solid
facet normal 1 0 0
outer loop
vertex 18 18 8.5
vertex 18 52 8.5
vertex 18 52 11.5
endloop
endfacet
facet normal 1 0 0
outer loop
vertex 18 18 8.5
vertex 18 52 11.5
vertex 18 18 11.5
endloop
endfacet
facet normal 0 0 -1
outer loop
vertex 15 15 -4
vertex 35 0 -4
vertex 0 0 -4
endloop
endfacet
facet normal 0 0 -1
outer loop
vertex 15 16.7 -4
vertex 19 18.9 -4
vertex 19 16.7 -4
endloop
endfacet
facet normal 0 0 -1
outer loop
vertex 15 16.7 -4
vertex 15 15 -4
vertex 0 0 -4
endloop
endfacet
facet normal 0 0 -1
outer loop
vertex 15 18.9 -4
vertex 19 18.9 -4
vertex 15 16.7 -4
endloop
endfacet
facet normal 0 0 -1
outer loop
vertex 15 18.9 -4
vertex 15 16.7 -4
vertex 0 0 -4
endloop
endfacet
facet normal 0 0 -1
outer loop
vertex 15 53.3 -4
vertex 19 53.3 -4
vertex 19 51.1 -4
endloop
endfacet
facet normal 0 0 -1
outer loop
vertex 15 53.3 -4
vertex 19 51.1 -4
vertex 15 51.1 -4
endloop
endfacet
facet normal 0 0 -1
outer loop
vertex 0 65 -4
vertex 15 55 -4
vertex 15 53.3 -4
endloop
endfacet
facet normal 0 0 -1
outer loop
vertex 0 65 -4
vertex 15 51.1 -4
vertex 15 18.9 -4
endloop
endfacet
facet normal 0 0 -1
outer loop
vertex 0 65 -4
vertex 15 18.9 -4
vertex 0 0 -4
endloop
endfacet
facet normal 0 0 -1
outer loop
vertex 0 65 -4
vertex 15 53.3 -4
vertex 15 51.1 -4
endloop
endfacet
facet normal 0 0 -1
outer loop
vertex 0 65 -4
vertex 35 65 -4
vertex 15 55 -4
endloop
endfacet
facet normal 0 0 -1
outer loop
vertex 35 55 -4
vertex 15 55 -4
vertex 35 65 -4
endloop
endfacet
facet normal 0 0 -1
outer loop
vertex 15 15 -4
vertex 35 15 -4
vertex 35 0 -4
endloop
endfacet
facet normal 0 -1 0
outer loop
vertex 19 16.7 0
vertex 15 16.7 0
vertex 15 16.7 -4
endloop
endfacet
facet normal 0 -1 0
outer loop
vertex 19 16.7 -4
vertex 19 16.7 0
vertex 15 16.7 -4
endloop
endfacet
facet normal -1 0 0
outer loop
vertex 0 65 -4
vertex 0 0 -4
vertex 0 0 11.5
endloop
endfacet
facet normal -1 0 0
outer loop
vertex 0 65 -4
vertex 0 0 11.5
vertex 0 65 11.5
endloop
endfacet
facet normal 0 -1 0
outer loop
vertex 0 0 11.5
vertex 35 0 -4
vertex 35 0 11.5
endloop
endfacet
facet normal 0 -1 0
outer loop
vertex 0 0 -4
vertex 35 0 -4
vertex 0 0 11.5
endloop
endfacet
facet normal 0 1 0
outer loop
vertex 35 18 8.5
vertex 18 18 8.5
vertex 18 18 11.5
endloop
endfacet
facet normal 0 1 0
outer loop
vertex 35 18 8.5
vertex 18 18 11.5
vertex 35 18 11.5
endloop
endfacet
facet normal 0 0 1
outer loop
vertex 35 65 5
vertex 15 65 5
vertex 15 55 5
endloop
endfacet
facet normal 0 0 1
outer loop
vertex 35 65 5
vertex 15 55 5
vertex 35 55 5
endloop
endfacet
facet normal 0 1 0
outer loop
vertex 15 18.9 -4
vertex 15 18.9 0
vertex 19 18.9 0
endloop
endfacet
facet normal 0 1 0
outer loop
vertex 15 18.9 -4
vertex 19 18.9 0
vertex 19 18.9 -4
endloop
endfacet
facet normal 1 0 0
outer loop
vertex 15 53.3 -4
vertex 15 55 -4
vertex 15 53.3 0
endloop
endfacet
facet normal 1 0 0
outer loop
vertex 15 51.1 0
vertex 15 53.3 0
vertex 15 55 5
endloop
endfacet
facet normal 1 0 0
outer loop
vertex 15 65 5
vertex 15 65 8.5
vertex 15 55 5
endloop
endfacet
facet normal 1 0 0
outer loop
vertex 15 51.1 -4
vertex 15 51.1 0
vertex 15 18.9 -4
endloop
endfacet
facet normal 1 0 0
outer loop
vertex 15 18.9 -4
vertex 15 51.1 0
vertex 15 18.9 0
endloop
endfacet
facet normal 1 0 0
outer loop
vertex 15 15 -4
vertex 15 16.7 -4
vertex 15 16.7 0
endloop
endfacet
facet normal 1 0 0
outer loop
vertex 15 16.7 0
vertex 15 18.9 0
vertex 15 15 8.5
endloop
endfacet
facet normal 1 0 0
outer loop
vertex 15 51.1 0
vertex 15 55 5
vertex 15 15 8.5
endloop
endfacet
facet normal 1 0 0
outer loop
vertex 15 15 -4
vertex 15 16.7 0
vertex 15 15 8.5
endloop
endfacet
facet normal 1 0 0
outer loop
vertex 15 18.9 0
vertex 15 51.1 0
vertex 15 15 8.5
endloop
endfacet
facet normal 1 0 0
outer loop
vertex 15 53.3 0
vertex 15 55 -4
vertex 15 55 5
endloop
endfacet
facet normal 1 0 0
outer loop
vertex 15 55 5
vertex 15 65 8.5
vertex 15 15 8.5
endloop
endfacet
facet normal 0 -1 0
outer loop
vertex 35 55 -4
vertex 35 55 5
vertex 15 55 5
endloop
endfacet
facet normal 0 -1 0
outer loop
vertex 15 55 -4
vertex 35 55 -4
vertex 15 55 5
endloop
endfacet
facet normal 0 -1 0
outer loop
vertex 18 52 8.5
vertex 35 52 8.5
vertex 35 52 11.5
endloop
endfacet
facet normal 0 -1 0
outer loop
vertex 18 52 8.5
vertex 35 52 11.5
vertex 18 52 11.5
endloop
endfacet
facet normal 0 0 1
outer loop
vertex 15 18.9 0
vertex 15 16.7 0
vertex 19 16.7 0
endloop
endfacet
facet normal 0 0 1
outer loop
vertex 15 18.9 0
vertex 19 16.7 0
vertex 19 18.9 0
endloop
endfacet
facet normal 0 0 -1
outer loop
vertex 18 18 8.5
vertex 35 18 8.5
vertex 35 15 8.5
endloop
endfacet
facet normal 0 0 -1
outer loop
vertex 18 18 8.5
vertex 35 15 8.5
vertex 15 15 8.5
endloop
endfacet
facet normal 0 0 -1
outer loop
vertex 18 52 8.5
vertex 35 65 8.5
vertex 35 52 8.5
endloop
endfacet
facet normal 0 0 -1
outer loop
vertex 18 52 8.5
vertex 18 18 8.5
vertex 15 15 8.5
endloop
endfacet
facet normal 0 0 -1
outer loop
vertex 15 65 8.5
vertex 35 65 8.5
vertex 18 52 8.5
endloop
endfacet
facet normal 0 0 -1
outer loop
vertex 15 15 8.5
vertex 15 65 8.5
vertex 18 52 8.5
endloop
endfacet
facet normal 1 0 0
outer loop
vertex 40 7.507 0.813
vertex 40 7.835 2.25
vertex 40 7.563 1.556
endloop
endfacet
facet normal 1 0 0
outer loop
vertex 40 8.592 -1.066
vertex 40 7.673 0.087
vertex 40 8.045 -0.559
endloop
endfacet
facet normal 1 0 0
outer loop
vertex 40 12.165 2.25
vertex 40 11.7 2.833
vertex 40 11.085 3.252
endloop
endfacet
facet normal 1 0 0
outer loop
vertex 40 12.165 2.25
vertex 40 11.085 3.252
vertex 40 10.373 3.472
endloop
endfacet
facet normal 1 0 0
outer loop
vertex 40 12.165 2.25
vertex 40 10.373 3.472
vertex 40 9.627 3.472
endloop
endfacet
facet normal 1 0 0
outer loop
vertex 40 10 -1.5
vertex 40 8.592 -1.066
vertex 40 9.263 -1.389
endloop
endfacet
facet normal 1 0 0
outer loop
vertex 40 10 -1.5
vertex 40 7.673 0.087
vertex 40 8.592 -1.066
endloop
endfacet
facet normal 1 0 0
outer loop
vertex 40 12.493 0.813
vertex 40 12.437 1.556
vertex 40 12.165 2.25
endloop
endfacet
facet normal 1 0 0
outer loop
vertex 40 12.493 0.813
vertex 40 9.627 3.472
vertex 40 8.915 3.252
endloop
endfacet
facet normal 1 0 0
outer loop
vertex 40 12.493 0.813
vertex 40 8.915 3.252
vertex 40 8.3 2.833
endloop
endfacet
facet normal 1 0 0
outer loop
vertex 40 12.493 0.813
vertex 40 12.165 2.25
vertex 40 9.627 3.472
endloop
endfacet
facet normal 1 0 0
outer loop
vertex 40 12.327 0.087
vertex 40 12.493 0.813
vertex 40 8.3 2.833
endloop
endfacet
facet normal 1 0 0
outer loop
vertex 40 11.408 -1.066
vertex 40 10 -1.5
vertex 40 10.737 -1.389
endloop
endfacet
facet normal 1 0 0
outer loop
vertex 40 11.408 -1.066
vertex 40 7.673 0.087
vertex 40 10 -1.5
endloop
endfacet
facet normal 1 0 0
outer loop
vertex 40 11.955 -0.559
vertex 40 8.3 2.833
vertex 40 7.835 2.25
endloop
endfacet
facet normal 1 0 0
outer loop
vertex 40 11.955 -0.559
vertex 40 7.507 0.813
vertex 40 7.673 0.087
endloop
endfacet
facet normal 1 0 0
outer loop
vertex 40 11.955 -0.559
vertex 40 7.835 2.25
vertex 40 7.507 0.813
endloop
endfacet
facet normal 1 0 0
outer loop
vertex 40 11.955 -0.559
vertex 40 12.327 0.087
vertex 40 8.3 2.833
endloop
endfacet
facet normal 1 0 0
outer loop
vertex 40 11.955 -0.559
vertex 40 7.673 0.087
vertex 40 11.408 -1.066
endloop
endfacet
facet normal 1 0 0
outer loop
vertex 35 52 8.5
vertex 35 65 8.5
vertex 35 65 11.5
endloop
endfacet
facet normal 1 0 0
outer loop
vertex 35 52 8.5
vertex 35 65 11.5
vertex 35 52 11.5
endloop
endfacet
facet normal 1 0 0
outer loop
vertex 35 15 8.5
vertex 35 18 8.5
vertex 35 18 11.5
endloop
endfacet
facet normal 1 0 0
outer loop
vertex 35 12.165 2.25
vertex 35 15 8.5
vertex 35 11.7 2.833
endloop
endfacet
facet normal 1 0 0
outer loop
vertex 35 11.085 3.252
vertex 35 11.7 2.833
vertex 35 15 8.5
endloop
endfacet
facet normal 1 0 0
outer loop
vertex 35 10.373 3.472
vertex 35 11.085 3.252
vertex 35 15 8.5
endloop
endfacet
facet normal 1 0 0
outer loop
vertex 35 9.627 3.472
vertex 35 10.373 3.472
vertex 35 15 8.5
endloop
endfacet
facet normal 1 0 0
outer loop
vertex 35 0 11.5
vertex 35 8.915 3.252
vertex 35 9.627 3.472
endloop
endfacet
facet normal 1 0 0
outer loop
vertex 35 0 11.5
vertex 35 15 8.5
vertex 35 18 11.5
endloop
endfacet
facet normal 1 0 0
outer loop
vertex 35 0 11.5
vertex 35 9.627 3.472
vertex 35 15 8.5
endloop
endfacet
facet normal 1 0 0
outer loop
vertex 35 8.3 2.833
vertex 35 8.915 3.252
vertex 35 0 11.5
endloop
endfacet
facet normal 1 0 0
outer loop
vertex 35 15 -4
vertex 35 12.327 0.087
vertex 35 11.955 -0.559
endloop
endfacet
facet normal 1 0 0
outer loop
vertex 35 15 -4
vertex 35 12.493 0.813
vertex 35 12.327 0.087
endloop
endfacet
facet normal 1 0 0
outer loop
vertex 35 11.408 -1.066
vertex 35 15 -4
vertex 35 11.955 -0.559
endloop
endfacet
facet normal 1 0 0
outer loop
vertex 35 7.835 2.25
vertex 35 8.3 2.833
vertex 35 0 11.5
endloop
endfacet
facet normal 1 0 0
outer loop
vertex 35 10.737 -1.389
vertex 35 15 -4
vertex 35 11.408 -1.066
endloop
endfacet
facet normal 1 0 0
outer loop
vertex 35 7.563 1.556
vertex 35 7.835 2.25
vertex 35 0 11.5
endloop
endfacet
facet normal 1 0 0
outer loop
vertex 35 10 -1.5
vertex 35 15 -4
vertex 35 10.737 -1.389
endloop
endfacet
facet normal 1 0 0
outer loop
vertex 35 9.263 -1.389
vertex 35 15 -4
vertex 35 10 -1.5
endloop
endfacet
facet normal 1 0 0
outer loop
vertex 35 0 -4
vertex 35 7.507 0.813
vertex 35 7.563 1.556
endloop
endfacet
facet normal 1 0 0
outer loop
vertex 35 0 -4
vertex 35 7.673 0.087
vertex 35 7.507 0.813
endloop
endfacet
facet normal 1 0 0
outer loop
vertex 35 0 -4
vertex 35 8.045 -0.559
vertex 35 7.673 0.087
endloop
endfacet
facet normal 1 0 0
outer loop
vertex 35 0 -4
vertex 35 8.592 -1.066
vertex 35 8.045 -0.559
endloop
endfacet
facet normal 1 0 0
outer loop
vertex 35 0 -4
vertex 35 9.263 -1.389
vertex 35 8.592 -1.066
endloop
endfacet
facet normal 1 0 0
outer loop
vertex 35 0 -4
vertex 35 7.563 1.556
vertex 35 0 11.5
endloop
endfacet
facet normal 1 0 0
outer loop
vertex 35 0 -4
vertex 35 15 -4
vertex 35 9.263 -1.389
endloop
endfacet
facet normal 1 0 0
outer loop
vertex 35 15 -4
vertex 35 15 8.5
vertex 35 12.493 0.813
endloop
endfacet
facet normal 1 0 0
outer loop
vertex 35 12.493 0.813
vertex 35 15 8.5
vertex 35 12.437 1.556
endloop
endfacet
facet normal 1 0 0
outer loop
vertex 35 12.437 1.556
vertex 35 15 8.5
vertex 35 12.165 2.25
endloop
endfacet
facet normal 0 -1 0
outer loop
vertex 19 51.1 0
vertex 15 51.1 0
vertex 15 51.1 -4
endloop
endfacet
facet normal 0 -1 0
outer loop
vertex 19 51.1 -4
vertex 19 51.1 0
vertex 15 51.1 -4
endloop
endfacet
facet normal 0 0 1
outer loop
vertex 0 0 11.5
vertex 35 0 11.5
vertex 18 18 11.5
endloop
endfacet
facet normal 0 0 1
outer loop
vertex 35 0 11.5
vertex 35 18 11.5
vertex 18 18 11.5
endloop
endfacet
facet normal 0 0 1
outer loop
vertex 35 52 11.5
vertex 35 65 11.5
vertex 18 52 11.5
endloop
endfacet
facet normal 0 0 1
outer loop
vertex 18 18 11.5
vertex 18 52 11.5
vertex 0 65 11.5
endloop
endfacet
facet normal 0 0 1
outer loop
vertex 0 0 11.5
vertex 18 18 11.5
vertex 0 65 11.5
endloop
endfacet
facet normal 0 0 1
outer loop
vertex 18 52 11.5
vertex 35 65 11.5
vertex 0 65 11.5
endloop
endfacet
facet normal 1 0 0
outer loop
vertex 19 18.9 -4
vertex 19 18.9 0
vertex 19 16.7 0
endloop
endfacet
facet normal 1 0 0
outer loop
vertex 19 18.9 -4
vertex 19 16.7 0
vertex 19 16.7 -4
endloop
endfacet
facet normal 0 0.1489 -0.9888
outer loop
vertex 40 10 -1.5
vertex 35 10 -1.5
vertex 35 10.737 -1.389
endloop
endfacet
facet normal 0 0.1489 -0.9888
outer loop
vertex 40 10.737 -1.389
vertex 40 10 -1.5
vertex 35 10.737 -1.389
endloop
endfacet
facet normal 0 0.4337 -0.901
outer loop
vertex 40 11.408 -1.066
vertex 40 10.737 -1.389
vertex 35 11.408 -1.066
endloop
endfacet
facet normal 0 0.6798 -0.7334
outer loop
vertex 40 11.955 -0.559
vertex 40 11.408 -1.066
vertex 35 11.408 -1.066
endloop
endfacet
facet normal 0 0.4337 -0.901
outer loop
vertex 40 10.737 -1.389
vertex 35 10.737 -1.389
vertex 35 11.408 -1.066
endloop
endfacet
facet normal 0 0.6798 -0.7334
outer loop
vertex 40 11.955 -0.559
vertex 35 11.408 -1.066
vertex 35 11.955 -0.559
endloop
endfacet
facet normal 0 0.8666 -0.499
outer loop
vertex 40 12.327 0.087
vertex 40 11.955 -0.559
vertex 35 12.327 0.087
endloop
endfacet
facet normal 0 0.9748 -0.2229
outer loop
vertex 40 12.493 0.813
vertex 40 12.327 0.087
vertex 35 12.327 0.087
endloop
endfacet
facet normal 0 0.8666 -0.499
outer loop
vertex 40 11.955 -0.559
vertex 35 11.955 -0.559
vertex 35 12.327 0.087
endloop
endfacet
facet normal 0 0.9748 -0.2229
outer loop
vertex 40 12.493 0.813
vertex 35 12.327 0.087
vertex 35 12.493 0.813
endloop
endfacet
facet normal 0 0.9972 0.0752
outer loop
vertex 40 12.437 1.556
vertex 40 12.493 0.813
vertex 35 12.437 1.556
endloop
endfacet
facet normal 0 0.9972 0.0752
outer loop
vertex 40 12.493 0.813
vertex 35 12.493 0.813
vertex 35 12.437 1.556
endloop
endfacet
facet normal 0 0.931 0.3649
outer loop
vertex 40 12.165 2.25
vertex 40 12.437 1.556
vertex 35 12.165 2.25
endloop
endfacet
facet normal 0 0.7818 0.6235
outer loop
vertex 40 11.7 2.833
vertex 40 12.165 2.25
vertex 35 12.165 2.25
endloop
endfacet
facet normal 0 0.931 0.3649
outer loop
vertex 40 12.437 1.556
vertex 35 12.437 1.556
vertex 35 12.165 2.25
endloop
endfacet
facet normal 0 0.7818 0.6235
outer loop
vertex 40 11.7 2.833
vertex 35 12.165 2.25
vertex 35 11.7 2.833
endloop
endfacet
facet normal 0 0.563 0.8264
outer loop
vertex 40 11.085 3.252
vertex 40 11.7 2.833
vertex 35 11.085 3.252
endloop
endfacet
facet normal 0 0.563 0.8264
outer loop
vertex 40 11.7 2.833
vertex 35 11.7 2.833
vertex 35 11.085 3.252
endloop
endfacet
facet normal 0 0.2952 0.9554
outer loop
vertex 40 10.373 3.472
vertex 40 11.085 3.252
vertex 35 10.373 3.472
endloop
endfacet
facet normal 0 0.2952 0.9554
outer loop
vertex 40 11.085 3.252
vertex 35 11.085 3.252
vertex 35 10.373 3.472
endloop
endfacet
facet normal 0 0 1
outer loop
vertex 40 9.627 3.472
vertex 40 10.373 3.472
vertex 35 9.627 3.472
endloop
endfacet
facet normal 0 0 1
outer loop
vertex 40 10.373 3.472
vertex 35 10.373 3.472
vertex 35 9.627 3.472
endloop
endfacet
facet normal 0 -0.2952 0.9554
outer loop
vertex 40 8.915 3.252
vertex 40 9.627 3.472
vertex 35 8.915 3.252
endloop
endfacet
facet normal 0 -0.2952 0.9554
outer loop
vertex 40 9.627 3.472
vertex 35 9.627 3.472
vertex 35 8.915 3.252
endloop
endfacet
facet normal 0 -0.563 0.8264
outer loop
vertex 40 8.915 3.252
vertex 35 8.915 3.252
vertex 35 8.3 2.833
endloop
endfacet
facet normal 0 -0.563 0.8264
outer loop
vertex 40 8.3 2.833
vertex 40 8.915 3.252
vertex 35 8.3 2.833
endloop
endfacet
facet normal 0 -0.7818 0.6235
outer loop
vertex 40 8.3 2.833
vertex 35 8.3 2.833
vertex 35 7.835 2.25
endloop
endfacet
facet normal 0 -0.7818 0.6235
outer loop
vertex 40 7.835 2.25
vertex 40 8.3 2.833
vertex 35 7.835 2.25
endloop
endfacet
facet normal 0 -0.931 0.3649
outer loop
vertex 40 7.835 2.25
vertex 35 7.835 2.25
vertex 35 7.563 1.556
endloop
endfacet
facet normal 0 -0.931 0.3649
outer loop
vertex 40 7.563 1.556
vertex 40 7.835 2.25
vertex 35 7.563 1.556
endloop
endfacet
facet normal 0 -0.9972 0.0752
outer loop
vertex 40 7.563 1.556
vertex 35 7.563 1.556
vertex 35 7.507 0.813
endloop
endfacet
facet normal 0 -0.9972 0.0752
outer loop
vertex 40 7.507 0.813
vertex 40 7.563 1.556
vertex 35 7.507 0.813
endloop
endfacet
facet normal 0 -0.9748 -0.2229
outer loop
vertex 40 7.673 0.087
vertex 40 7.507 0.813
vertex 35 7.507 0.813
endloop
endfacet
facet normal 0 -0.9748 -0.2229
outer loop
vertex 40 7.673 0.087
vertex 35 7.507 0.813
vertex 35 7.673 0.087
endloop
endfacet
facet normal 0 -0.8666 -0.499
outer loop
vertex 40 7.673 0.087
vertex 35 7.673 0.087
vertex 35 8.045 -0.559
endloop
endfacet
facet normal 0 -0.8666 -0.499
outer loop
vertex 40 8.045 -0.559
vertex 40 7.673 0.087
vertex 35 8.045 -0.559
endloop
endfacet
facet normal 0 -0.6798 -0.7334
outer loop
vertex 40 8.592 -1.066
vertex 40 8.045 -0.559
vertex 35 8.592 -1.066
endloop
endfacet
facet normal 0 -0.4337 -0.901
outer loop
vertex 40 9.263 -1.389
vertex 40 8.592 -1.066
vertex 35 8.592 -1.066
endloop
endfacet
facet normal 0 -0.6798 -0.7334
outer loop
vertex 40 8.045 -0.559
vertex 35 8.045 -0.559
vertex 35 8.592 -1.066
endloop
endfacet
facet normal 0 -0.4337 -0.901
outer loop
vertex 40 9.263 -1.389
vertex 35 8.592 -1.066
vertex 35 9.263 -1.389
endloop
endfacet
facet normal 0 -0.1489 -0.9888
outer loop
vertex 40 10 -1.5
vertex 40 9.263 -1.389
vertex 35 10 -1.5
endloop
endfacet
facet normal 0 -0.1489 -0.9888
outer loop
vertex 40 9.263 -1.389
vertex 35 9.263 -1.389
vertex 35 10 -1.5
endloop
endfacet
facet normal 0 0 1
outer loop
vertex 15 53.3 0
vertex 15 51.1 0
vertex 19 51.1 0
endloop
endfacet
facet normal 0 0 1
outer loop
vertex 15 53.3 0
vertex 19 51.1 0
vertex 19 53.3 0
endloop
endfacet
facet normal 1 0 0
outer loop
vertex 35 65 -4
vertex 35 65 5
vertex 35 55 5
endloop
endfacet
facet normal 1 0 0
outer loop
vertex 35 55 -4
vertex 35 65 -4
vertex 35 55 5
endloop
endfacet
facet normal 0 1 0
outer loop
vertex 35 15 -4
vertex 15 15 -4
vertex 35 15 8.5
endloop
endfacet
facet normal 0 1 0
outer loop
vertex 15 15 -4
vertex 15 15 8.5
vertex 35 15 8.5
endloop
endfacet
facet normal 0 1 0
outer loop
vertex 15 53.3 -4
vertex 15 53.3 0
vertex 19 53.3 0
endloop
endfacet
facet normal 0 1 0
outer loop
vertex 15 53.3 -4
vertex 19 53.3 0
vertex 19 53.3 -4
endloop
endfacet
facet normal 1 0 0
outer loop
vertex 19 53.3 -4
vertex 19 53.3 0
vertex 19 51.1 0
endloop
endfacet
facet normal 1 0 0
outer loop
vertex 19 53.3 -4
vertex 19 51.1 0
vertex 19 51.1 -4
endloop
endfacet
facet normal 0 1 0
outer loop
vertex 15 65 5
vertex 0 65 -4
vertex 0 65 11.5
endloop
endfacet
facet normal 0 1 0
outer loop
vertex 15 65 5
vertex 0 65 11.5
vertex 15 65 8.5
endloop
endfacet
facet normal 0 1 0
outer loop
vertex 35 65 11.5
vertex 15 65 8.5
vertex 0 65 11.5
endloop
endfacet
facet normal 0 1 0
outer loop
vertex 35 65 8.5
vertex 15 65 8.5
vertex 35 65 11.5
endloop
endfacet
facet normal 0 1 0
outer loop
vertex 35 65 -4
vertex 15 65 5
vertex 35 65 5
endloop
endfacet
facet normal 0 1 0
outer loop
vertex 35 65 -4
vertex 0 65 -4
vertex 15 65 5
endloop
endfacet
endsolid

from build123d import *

# Parameters (mm, degrees)
BOSS_EXTRUDE1_DEPTH      = 8.5
BOSS_EXTRUDE1_DEPTH_BACK = 4
SKETCH3_W                = 40
SKETCH3_H                = 3.5
CUT_EXTRUDE1_DEPTH       = 10
BOSS_EXTRUDE2_DEPTH      = 3
SKETCH5_R                = 2.5
BOSS_EXTRUDE3_DEPTH      = 5
SKETCH6_W                = 4
SKETCH6_H                = 2.2
BOSS_EXTRUDE4_DEPTH      = 4


with BuildPart() as part:
    # Sketch1 → Boss-Extrude1 (new body, two sides)
    with BuildSketch(Plane.XY) as boss_extrude1_sk:
        Polygon((0, 0), (0, 65), (35, 65), (35, 55), (15, 55), (15, 15), (35, 15), (35, 0), align=None)
    extrude(amount=BOSS_EXTRUDE1_DEPTH)
    extrude(boss_extrude1_sk.sketch, amount=-BOSS_EXTRUDE1_DEPTH_BACK)

    # Sketch3 → Cut-Extrude1 (cut)
    with BuildSketch(Plane(origin=(0, 65, 0), x_dir=(1, 0, 0), z_dir=(0, 1, 0))):
        with Locations((35, -6.75)):
            Rectangle(SKETCH3_W, SKETCH3_H)
    extrude(amount=-CUT_EXTRUDE1_DEPTH, mode=Mode.SUBTRACT)

    # Sketch4 → Boss-Extrude2 (add)
    with BuildSketch(Plane.XY.offset(8.5)):
        Polygon((35, 0), (0, 0), (0, 65), (35, 65), (35, 52), (18, 52), (18, 18), (35, 18), align=None)
    extrude(amount=BOSS_EXTRUDE2_DEPTH)

    # Sketch5 → Boss-Extrude3 (add)
    with BuildSketch(Plane(origin=(35, 0, 0), x_dir=(0, 0, -1), z_dir=(1, 0, 0))):
        with Locations((-1, 10)):
            Circle(SKETCH5_R)
    extrude(amount=BOSS_EXTRUDE3_DEPTH)

    # Sketch6 → Boss-Extrude4 (add)
    with BuildSketch(Plane(origin=(15, 0, 0), x_dir=(0, 0, -1), z_dir=(1, 0, 0))):
        with Locations((2, 52.2)):
            Rectangle(SKETCH6_W, SKETCH6_H)
        with Locations((2, 17.8)):
            Rectangle(SKETCH6_W, SKETCH6_H)
    extrude(amount=BOSS_EXTRUDE4_DEPTH)


solid = part.part
